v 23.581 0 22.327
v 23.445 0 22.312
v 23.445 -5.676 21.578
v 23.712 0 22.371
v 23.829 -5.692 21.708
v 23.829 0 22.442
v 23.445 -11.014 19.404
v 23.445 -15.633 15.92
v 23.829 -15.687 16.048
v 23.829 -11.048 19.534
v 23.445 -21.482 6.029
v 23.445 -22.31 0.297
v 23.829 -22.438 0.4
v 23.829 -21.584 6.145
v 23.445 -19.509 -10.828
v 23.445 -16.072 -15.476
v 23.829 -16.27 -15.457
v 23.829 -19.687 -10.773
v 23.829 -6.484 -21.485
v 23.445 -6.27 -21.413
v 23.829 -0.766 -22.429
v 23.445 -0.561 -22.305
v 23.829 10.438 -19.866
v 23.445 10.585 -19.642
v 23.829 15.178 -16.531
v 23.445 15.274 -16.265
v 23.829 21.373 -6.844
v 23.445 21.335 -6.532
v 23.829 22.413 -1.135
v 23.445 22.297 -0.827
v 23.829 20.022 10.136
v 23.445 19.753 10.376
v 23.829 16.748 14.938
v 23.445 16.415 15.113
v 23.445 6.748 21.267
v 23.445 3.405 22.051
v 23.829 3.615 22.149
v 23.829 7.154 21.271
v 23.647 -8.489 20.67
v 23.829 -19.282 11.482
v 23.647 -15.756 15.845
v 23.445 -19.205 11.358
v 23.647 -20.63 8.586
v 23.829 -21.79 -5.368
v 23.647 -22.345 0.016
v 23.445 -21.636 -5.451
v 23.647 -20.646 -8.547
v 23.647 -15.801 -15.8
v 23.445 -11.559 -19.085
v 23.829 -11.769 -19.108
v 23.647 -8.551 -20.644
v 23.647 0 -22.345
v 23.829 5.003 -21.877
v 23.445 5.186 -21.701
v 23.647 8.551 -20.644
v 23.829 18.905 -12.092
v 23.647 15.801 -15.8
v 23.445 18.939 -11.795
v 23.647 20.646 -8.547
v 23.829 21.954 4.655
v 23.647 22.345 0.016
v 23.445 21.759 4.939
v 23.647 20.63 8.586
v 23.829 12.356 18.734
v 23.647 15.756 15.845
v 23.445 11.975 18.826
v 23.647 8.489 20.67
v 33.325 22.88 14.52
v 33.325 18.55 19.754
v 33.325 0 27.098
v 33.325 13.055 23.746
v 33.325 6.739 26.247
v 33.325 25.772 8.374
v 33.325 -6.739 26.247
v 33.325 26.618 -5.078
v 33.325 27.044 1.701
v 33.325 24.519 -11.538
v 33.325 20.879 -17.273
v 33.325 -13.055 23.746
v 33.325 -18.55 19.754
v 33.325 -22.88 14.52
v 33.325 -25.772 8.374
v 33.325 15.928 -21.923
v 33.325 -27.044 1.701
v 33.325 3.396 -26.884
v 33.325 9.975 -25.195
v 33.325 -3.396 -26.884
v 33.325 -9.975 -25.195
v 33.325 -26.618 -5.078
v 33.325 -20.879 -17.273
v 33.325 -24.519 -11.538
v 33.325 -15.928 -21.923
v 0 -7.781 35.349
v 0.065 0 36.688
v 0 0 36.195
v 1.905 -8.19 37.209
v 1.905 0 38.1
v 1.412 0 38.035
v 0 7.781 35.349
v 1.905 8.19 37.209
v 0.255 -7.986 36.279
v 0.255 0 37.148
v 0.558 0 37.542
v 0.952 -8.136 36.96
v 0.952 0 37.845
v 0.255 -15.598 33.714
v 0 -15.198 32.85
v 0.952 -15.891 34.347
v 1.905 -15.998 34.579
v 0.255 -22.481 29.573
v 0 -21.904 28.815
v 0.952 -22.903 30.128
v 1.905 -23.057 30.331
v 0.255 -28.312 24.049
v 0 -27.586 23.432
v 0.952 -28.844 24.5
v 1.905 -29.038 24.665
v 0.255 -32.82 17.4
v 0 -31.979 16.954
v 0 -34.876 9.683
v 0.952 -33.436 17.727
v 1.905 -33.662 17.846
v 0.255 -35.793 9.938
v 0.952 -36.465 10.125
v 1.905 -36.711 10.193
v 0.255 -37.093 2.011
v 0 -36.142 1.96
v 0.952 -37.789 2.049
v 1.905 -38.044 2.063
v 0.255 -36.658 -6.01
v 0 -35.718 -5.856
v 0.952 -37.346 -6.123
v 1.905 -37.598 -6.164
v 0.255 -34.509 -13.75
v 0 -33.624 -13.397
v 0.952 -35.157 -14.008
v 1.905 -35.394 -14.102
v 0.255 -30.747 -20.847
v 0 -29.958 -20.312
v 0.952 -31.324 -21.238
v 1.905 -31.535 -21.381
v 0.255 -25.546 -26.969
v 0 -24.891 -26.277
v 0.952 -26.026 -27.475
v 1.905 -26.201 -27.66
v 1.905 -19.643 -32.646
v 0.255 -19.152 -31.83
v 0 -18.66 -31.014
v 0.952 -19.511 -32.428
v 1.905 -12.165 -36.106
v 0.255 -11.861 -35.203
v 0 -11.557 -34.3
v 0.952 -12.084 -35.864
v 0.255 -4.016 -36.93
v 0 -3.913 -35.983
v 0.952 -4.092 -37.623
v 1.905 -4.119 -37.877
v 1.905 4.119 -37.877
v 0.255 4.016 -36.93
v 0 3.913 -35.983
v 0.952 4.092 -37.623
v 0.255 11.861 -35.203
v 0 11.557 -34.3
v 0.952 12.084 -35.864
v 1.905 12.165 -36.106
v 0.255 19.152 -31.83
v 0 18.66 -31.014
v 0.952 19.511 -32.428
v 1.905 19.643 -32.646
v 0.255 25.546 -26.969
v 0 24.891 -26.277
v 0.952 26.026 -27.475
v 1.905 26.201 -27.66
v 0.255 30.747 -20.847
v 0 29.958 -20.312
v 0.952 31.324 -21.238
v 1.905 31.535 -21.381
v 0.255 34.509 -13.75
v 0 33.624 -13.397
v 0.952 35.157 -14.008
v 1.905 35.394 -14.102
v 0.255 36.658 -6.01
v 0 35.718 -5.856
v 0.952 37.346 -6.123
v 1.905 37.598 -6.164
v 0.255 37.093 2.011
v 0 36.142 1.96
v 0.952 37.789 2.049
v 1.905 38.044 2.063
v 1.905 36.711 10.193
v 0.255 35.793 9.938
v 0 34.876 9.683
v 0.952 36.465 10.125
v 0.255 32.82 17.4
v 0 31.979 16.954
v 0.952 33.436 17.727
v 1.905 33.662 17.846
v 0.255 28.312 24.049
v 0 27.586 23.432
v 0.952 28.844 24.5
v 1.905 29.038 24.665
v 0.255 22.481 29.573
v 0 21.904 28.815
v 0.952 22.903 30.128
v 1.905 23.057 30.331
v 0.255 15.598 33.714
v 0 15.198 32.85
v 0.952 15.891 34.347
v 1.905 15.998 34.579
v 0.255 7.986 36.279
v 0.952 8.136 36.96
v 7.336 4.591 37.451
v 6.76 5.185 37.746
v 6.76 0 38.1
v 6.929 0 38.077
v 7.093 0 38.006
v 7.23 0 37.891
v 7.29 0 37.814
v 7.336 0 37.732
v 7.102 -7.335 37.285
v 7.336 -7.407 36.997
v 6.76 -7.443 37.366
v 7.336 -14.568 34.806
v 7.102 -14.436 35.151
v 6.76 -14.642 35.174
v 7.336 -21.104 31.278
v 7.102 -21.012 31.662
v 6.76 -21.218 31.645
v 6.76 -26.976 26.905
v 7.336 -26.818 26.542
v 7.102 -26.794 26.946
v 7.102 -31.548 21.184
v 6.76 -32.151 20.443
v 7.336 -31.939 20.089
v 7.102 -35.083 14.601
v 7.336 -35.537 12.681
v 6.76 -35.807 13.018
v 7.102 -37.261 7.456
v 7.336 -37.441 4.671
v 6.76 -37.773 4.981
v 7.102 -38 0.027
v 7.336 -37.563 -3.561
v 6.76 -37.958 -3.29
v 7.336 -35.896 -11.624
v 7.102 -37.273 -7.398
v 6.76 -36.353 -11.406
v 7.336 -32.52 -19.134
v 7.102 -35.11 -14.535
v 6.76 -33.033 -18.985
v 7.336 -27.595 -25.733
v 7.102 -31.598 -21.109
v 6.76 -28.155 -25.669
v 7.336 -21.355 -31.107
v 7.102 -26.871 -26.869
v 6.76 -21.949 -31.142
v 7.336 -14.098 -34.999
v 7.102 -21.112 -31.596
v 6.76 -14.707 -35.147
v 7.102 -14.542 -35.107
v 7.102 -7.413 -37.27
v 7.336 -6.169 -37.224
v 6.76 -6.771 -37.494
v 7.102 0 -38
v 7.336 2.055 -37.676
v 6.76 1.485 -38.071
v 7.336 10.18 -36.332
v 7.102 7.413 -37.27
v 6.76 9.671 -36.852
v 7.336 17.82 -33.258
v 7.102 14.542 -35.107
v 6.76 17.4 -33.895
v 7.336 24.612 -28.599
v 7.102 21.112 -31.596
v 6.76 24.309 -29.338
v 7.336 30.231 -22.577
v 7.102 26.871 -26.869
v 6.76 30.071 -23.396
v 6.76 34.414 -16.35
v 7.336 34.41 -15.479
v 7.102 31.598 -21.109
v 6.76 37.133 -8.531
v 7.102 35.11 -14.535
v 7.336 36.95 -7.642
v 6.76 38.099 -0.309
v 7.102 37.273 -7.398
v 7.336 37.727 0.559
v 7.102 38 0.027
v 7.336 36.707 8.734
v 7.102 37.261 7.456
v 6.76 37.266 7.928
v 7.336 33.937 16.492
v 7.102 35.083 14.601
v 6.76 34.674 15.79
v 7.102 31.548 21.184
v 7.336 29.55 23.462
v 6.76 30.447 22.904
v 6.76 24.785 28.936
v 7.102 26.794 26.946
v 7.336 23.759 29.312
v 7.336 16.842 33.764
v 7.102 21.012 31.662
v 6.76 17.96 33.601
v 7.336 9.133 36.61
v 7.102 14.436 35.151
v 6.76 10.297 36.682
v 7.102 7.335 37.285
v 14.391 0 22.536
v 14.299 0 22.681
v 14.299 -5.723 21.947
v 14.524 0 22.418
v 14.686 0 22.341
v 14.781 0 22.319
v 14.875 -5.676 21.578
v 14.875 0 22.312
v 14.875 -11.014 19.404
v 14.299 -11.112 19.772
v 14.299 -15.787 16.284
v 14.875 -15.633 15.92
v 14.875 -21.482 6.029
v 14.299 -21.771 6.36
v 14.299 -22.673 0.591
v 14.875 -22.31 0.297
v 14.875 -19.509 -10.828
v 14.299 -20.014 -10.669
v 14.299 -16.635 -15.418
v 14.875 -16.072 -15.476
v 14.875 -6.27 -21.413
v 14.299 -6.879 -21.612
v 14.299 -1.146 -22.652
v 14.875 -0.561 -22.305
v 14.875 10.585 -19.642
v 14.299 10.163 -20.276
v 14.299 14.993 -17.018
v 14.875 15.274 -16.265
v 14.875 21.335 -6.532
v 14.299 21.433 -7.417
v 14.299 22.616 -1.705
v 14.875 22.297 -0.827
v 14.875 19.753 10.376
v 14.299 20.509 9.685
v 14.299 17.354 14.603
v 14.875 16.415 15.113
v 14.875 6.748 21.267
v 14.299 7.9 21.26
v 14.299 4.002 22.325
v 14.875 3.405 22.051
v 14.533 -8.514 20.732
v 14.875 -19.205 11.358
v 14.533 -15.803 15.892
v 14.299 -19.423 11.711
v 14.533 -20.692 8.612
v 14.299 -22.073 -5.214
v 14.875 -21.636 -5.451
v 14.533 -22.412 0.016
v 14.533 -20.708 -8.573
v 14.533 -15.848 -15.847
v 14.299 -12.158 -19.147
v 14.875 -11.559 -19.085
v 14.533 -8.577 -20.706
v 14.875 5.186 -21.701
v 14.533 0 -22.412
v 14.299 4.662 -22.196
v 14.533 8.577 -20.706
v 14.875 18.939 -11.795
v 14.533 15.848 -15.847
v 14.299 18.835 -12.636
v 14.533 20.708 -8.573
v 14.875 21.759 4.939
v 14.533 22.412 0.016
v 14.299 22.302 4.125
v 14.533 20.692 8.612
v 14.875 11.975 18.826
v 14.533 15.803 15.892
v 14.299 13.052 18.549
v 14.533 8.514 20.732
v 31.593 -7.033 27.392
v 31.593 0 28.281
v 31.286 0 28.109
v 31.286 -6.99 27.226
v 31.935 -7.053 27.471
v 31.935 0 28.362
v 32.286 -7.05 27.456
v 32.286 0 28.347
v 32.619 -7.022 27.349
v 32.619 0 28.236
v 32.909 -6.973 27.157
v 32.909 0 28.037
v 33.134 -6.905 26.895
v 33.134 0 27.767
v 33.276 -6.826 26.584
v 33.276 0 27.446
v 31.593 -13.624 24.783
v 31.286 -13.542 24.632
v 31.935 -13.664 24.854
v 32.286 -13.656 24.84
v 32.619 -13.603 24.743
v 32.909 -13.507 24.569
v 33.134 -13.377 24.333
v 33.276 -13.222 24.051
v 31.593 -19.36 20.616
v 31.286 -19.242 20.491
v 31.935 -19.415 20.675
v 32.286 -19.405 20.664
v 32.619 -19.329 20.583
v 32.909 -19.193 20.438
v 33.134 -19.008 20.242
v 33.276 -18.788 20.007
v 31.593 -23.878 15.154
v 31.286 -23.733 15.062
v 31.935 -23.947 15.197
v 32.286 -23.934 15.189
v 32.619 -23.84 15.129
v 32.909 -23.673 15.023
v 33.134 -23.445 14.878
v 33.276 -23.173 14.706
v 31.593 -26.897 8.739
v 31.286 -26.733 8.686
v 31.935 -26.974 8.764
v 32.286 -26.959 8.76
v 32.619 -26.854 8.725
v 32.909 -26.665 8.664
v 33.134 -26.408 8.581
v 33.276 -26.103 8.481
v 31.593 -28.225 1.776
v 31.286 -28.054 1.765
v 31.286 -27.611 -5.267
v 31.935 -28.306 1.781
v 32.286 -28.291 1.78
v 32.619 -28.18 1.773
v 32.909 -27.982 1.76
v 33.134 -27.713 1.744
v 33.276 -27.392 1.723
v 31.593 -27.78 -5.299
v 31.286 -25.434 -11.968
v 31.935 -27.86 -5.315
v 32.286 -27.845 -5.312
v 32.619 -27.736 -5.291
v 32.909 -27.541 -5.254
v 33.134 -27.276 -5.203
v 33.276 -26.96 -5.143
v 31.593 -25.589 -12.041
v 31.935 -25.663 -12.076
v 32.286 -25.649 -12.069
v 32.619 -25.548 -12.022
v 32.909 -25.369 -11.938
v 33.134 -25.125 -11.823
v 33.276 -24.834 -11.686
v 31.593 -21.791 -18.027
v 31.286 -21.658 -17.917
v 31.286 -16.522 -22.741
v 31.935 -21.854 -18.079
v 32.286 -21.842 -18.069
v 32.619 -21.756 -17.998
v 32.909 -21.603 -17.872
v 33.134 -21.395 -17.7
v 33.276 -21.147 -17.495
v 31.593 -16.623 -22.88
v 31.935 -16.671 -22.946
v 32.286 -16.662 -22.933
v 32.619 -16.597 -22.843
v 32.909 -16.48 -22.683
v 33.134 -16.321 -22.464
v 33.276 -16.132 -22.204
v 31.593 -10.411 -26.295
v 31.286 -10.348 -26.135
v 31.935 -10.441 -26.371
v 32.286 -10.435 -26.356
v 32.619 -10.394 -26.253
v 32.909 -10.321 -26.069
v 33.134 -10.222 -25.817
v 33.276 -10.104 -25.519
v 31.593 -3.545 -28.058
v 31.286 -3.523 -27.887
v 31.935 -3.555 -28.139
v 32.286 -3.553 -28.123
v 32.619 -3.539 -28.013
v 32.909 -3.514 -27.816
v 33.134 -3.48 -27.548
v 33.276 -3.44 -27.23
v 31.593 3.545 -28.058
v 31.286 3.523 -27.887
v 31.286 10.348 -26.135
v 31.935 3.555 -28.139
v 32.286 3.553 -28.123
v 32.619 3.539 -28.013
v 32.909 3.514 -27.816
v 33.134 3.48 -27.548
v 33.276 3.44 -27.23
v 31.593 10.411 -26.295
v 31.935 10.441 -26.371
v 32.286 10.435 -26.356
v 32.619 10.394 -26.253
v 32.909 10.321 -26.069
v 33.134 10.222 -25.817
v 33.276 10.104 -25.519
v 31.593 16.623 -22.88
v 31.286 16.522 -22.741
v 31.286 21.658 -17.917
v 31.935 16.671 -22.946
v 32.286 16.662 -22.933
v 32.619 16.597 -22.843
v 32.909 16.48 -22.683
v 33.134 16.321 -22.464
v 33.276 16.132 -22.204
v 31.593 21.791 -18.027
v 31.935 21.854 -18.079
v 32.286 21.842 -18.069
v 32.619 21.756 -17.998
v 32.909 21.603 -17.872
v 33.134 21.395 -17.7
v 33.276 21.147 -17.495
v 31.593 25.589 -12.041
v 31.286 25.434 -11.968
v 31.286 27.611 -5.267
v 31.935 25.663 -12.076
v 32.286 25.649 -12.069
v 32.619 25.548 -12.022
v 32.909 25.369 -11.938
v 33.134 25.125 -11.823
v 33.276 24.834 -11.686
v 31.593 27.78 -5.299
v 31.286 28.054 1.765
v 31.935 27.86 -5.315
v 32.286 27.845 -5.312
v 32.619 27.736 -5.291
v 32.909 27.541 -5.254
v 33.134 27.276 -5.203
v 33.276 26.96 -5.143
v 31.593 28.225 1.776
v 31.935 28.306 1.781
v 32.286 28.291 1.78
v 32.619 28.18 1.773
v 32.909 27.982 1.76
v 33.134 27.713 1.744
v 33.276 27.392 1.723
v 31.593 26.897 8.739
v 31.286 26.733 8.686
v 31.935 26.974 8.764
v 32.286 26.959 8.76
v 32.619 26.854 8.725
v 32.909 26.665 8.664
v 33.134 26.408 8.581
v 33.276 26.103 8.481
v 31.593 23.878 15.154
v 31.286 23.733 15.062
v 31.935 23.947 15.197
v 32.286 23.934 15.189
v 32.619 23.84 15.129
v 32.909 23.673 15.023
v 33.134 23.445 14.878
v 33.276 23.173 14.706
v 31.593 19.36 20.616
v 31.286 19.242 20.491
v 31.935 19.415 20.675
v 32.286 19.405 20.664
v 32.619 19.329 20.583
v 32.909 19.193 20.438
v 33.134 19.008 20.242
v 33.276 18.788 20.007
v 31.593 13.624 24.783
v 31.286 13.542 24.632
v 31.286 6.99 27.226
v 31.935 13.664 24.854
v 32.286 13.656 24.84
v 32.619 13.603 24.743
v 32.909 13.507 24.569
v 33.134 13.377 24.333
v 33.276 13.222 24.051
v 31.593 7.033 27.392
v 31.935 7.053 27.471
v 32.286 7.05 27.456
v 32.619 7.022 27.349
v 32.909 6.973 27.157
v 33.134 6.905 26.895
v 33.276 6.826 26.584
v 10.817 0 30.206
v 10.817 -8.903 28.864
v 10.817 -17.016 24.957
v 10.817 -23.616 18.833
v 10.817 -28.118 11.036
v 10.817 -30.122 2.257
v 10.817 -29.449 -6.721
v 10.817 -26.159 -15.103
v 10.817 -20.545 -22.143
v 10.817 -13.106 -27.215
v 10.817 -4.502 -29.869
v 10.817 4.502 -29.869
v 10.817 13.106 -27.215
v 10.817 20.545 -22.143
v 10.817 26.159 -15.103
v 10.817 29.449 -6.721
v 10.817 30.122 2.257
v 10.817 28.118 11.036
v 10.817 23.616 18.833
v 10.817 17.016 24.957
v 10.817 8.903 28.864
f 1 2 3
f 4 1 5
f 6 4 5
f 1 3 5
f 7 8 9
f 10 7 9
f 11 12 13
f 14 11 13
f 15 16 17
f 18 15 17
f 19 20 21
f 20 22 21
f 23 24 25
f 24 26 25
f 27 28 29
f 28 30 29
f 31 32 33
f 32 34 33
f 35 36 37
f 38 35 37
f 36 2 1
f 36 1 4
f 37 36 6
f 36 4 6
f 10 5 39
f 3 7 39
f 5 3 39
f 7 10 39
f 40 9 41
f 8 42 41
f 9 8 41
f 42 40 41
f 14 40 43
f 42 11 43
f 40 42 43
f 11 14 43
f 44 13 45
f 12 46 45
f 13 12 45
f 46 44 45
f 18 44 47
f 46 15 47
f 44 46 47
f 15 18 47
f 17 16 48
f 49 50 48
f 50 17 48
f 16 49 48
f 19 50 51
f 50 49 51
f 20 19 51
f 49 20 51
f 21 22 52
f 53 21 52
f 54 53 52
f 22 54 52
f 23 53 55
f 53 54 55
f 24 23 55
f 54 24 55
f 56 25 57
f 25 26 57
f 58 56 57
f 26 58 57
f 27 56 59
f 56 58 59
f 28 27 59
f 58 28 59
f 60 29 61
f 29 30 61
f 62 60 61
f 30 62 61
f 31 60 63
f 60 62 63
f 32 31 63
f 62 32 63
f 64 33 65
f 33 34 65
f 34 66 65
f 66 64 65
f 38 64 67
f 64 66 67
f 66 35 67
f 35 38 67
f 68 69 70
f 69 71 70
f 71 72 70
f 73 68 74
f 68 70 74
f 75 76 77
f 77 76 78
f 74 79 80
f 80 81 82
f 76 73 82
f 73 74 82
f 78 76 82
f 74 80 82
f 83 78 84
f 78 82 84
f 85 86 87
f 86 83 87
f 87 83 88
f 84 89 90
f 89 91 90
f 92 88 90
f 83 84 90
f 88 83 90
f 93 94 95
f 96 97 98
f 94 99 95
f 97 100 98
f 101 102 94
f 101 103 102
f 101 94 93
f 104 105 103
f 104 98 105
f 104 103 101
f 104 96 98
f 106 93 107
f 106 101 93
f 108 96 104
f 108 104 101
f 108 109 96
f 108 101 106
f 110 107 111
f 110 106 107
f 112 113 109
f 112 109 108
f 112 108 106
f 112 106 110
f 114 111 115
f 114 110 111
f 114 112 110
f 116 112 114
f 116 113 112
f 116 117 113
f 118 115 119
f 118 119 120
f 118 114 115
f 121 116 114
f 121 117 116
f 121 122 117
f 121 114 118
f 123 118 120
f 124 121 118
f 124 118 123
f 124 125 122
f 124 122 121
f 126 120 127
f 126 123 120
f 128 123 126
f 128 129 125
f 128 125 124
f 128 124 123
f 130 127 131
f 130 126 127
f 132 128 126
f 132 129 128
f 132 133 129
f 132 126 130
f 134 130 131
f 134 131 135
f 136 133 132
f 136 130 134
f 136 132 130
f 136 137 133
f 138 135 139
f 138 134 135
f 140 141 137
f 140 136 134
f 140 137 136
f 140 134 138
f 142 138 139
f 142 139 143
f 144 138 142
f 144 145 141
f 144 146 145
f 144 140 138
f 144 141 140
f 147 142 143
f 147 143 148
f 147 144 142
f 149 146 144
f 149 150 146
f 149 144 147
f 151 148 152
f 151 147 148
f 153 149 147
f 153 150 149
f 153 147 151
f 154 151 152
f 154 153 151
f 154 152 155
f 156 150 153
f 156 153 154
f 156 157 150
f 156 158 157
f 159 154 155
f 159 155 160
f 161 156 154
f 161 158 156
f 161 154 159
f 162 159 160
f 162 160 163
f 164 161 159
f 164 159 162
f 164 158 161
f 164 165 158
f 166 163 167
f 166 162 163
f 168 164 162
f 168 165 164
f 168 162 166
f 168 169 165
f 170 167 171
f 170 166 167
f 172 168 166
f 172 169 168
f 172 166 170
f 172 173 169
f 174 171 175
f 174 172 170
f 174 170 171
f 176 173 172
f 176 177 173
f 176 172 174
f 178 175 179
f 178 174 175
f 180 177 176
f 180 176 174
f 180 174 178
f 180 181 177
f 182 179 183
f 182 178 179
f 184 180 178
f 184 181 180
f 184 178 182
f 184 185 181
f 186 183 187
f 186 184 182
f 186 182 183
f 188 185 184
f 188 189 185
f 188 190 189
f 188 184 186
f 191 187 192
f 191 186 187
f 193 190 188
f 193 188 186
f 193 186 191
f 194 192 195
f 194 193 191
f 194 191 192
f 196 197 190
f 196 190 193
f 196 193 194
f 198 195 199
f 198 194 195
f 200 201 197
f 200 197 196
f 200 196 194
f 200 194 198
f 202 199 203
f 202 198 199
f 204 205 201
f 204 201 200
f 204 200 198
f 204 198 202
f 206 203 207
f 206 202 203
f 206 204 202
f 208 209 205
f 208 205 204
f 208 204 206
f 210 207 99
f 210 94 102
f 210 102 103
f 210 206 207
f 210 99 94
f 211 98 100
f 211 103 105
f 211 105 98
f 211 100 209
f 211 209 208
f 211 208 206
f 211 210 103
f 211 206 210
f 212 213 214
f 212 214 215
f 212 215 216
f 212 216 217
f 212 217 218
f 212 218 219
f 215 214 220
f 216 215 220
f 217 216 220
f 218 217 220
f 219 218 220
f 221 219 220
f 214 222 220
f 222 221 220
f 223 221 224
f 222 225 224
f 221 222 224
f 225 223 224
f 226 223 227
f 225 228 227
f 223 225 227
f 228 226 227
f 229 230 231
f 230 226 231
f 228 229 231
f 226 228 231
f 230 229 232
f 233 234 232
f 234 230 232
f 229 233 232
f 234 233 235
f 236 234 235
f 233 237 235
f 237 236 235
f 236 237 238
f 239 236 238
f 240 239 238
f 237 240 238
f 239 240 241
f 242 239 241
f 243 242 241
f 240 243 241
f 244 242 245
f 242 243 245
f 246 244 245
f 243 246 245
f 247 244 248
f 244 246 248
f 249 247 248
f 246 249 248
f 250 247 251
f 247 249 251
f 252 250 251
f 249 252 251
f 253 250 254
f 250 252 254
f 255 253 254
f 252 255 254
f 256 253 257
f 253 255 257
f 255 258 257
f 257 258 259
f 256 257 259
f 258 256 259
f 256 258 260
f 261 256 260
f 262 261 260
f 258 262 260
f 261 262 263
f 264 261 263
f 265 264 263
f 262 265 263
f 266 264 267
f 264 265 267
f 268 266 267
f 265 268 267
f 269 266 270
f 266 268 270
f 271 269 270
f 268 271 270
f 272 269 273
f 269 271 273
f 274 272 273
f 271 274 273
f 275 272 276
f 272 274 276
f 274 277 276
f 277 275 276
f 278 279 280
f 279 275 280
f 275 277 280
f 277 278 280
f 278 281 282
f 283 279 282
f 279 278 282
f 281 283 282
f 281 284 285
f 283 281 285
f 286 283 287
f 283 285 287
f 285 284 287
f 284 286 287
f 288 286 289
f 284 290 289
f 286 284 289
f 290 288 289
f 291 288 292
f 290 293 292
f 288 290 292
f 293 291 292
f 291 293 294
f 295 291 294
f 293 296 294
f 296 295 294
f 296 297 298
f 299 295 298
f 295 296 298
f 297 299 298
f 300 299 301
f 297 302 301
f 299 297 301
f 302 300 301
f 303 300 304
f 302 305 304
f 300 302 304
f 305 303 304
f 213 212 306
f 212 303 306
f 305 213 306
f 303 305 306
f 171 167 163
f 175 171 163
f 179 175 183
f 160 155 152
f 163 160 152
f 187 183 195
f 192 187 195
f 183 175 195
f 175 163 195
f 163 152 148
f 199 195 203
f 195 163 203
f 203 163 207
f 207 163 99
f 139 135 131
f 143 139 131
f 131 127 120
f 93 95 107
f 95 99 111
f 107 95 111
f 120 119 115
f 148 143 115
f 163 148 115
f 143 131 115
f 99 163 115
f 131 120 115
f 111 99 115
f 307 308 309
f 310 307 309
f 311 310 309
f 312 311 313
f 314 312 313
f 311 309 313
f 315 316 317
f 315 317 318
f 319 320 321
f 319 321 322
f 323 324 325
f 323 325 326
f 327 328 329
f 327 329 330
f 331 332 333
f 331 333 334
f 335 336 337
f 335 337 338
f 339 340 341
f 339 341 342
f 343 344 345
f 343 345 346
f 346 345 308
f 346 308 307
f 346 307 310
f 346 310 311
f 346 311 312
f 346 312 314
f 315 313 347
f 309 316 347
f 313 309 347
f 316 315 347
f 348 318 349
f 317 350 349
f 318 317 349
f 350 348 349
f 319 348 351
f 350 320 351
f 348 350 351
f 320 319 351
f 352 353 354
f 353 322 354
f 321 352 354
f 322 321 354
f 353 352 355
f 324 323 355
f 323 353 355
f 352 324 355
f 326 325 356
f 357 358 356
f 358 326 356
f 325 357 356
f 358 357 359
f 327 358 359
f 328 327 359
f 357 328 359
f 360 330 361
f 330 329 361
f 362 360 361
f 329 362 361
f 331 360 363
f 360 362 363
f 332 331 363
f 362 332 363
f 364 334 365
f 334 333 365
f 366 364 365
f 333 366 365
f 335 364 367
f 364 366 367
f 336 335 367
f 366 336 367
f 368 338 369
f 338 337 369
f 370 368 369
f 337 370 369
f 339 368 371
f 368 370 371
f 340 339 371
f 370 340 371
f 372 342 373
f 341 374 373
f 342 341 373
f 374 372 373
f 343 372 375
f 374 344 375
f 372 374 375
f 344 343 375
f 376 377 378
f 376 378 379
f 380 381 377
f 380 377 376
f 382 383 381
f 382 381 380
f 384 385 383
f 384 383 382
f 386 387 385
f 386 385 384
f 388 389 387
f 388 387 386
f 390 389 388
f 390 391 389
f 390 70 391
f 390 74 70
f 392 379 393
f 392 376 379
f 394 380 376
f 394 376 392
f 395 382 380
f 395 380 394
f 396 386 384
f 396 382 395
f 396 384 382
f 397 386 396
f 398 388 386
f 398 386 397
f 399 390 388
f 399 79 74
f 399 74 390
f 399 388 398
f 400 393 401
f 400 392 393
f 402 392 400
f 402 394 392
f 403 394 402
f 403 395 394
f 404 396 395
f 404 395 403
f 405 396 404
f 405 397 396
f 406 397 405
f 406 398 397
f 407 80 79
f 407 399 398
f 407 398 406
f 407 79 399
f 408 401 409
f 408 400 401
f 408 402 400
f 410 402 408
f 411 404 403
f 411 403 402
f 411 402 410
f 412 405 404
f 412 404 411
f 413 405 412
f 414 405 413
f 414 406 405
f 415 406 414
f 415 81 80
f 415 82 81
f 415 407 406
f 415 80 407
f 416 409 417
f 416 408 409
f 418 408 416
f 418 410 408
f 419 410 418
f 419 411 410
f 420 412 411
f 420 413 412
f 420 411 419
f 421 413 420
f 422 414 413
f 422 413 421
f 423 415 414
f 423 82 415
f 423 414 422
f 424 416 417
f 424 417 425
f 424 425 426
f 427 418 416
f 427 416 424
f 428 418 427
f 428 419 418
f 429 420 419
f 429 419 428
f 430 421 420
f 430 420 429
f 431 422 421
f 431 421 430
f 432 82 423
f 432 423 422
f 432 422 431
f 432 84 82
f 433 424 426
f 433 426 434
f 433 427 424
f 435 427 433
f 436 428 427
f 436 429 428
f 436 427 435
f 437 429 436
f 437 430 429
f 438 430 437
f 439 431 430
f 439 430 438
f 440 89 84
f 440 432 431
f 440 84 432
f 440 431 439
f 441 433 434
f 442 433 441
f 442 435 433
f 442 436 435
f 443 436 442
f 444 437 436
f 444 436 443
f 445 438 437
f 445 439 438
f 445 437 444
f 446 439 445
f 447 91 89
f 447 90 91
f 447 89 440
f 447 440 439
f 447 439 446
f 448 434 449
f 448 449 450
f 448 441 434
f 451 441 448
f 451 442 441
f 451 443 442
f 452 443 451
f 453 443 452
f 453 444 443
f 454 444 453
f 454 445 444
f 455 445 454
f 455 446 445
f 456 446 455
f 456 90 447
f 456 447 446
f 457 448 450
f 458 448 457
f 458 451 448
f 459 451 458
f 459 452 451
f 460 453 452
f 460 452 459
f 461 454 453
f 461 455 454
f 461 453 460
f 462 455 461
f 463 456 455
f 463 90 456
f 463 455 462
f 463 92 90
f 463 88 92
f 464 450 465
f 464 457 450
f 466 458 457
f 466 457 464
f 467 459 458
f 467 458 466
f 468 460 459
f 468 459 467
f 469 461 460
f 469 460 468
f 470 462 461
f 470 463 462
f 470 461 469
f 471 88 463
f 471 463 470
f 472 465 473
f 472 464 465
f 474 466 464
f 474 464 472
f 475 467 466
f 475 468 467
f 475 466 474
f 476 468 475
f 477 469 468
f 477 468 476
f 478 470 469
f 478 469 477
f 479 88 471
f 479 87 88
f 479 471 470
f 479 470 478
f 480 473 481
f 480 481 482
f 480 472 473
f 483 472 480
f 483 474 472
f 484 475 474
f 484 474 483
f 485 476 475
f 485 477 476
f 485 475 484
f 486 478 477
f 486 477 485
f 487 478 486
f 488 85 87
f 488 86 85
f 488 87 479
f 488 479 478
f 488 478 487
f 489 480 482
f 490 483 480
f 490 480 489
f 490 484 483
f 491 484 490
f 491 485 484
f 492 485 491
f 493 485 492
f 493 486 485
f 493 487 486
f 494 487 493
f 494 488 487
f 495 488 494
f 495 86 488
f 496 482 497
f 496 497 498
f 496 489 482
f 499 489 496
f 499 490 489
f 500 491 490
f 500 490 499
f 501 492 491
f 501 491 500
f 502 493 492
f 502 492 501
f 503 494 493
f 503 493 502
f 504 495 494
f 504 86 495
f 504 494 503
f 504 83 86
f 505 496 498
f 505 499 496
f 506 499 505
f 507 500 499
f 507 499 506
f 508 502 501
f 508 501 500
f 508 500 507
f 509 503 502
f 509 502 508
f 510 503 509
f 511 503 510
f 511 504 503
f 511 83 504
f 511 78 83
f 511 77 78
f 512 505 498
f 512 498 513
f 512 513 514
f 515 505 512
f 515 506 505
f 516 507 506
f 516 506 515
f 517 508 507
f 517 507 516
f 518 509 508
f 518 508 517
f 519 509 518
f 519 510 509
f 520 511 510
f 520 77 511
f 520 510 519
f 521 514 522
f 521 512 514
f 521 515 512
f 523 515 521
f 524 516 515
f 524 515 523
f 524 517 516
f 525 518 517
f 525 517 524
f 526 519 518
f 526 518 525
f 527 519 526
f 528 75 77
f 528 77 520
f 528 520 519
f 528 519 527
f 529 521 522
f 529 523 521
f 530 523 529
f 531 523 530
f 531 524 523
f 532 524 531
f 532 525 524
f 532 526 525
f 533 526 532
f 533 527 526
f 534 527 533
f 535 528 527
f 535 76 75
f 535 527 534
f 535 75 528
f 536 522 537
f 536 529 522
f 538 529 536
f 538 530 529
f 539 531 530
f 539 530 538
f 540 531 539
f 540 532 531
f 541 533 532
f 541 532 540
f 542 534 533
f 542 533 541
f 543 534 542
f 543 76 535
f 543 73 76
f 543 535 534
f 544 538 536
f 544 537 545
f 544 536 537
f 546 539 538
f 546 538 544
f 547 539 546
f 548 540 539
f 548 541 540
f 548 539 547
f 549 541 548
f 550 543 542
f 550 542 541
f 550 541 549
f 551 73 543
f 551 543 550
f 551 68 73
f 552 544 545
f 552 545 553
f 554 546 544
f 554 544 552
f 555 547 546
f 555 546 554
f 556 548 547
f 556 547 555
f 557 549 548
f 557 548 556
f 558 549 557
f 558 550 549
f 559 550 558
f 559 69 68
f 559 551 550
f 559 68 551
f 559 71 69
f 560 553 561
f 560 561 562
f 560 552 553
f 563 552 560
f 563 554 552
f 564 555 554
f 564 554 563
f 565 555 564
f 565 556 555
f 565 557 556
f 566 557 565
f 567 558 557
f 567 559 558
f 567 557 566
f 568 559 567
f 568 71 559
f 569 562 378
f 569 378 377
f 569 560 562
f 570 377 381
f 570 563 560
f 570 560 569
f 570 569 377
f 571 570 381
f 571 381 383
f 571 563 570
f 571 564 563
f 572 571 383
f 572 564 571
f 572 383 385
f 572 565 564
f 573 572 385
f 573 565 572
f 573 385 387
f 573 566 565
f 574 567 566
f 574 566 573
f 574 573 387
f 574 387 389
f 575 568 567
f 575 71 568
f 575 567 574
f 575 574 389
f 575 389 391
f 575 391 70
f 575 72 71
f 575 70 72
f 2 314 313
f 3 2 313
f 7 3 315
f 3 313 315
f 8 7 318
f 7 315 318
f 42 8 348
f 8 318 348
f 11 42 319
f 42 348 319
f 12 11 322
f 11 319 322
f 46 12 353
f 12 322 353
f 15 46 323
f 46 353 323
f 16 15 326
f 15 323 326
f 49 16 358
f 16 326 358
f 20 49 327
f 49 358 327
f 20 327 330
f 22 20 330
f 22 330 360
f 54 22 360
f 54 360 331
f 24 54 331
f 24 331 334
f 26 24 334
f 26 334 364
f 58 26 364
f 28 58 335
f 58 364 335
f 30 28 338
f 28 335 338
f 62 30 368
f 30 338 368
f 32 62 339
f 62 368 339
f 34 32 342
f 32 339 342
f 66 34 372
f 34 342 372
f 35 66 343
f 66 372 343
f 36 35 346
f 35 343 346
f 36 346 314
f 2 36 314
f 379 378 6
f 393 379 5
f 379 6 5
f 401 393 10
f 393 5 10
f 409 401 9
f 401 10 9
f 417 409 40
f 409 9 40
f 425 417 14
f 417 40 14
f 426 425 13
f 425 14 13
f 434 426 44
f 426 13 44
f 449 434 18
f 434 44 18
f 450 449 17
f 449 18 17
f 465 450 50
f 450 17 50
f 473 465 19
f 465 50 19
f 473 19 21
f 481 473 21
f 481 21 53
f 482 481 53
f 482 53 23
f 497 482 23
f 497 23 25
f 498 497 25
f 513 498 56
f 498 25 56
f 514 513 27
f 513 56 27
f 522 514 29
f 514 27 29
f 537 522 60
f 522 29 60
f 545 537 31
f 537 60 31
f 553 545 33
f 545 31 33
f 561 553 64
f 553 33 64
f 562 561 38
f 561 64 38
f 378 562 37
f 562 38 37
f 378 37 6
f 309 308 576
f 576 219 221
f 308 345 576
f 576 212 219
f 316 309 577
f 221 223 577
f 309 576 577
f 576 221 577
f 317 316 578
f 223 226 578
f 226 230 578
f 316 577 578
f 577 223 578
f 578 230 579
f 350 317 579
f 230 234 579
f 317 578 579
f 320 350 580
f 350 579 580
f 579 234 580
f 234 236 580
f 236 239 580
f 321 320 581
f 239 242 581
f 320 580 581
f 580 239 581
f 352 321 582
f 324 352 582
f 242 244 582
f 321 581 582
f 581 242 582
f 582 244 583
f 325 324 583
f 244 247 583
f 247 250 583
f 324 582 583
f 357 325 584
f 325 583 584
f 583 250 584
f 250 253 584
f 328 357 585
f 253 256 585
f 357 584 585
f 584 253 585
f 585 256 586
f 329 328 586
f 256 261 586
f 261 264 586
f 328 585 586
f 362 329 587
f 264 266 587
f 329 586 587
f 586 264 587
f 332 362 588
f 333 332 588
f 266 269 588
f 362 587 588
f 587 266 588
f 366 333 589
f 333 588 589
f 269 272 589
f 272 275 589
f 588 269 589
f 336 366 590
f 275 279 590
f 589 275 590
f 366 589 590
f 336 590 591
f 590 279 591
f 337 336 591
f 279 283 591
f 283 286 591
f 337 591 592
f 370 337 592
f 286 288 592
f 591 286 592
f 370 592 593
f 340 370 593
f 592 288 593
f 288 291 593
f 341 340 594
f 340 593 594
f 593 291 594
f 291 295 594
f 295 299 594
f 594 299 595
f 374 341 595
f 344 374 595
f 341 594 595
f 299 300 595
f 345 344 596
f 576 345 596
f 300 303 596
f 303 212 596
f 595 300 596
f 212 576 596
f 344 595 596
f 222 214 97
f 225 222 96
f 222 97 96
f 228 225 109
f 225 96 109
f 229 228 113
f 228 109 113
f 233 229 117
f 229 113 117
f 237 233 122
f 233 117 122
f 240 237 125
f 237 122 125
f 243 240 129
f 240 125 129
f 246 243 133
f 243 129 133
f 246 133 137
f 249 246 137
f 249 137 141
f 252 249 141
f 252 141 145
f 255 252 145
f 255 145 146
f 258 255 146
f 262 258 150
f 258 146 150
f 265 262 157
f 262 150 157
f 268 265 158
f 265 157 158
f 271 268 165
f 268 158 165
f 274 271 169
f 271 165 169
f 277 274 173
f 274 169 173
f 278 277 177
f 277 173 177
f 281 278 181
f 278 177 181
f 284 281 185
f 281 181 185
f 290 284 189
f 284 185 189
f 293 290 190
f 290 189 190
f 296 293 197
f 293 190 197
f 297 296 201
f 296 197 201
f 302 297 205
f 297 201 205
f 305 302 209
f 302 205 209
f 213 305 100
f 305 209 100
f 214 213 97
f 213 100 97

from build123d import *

# Parameters (mm, degrees)
F2_R = 1.905
F3_R = 0.635
F4_R = 1.27


with BuildPart() as f1:
    # F0 (on Front) → F1 (revolve)
    with BuildSketch(Plane.XZ):
        Polygon((0, 38.1), (0, 0), (33.3248, 0), (33.3248, 29.658252), (23.658611, 22.312216), (14.469195, 22.312216), (7.165415, 38.1), align=None)
    revolve(axis=Axis((16.6624, 0, 0), (1, 0, 0)))

    # F2
    f2_edges = [f1.edges().sort_by_distance(p)[0] for p in [
        (0, 0, -38.1),
    ]]
    fillet(f2_edges, radius=F2_R)

    # F3
    f3_edges = [f1.edges().sort_by_distance(p)[0] for p in [
        (7.165415, 0, -38.1),
        (14.469195, 0, -22.312216),
        (23.658611, 0, -22.312216),
    ]]
    fillet(f3_edges, radius=F3_R)

    # F4
    f4_edges = [f1.edges().sort_by_distance(p)[0] for p in [
        (33.3248, 0, -29.658252),
    ]]
    fillet(f4_edges, radius=F4_R)


solid = f1.part
